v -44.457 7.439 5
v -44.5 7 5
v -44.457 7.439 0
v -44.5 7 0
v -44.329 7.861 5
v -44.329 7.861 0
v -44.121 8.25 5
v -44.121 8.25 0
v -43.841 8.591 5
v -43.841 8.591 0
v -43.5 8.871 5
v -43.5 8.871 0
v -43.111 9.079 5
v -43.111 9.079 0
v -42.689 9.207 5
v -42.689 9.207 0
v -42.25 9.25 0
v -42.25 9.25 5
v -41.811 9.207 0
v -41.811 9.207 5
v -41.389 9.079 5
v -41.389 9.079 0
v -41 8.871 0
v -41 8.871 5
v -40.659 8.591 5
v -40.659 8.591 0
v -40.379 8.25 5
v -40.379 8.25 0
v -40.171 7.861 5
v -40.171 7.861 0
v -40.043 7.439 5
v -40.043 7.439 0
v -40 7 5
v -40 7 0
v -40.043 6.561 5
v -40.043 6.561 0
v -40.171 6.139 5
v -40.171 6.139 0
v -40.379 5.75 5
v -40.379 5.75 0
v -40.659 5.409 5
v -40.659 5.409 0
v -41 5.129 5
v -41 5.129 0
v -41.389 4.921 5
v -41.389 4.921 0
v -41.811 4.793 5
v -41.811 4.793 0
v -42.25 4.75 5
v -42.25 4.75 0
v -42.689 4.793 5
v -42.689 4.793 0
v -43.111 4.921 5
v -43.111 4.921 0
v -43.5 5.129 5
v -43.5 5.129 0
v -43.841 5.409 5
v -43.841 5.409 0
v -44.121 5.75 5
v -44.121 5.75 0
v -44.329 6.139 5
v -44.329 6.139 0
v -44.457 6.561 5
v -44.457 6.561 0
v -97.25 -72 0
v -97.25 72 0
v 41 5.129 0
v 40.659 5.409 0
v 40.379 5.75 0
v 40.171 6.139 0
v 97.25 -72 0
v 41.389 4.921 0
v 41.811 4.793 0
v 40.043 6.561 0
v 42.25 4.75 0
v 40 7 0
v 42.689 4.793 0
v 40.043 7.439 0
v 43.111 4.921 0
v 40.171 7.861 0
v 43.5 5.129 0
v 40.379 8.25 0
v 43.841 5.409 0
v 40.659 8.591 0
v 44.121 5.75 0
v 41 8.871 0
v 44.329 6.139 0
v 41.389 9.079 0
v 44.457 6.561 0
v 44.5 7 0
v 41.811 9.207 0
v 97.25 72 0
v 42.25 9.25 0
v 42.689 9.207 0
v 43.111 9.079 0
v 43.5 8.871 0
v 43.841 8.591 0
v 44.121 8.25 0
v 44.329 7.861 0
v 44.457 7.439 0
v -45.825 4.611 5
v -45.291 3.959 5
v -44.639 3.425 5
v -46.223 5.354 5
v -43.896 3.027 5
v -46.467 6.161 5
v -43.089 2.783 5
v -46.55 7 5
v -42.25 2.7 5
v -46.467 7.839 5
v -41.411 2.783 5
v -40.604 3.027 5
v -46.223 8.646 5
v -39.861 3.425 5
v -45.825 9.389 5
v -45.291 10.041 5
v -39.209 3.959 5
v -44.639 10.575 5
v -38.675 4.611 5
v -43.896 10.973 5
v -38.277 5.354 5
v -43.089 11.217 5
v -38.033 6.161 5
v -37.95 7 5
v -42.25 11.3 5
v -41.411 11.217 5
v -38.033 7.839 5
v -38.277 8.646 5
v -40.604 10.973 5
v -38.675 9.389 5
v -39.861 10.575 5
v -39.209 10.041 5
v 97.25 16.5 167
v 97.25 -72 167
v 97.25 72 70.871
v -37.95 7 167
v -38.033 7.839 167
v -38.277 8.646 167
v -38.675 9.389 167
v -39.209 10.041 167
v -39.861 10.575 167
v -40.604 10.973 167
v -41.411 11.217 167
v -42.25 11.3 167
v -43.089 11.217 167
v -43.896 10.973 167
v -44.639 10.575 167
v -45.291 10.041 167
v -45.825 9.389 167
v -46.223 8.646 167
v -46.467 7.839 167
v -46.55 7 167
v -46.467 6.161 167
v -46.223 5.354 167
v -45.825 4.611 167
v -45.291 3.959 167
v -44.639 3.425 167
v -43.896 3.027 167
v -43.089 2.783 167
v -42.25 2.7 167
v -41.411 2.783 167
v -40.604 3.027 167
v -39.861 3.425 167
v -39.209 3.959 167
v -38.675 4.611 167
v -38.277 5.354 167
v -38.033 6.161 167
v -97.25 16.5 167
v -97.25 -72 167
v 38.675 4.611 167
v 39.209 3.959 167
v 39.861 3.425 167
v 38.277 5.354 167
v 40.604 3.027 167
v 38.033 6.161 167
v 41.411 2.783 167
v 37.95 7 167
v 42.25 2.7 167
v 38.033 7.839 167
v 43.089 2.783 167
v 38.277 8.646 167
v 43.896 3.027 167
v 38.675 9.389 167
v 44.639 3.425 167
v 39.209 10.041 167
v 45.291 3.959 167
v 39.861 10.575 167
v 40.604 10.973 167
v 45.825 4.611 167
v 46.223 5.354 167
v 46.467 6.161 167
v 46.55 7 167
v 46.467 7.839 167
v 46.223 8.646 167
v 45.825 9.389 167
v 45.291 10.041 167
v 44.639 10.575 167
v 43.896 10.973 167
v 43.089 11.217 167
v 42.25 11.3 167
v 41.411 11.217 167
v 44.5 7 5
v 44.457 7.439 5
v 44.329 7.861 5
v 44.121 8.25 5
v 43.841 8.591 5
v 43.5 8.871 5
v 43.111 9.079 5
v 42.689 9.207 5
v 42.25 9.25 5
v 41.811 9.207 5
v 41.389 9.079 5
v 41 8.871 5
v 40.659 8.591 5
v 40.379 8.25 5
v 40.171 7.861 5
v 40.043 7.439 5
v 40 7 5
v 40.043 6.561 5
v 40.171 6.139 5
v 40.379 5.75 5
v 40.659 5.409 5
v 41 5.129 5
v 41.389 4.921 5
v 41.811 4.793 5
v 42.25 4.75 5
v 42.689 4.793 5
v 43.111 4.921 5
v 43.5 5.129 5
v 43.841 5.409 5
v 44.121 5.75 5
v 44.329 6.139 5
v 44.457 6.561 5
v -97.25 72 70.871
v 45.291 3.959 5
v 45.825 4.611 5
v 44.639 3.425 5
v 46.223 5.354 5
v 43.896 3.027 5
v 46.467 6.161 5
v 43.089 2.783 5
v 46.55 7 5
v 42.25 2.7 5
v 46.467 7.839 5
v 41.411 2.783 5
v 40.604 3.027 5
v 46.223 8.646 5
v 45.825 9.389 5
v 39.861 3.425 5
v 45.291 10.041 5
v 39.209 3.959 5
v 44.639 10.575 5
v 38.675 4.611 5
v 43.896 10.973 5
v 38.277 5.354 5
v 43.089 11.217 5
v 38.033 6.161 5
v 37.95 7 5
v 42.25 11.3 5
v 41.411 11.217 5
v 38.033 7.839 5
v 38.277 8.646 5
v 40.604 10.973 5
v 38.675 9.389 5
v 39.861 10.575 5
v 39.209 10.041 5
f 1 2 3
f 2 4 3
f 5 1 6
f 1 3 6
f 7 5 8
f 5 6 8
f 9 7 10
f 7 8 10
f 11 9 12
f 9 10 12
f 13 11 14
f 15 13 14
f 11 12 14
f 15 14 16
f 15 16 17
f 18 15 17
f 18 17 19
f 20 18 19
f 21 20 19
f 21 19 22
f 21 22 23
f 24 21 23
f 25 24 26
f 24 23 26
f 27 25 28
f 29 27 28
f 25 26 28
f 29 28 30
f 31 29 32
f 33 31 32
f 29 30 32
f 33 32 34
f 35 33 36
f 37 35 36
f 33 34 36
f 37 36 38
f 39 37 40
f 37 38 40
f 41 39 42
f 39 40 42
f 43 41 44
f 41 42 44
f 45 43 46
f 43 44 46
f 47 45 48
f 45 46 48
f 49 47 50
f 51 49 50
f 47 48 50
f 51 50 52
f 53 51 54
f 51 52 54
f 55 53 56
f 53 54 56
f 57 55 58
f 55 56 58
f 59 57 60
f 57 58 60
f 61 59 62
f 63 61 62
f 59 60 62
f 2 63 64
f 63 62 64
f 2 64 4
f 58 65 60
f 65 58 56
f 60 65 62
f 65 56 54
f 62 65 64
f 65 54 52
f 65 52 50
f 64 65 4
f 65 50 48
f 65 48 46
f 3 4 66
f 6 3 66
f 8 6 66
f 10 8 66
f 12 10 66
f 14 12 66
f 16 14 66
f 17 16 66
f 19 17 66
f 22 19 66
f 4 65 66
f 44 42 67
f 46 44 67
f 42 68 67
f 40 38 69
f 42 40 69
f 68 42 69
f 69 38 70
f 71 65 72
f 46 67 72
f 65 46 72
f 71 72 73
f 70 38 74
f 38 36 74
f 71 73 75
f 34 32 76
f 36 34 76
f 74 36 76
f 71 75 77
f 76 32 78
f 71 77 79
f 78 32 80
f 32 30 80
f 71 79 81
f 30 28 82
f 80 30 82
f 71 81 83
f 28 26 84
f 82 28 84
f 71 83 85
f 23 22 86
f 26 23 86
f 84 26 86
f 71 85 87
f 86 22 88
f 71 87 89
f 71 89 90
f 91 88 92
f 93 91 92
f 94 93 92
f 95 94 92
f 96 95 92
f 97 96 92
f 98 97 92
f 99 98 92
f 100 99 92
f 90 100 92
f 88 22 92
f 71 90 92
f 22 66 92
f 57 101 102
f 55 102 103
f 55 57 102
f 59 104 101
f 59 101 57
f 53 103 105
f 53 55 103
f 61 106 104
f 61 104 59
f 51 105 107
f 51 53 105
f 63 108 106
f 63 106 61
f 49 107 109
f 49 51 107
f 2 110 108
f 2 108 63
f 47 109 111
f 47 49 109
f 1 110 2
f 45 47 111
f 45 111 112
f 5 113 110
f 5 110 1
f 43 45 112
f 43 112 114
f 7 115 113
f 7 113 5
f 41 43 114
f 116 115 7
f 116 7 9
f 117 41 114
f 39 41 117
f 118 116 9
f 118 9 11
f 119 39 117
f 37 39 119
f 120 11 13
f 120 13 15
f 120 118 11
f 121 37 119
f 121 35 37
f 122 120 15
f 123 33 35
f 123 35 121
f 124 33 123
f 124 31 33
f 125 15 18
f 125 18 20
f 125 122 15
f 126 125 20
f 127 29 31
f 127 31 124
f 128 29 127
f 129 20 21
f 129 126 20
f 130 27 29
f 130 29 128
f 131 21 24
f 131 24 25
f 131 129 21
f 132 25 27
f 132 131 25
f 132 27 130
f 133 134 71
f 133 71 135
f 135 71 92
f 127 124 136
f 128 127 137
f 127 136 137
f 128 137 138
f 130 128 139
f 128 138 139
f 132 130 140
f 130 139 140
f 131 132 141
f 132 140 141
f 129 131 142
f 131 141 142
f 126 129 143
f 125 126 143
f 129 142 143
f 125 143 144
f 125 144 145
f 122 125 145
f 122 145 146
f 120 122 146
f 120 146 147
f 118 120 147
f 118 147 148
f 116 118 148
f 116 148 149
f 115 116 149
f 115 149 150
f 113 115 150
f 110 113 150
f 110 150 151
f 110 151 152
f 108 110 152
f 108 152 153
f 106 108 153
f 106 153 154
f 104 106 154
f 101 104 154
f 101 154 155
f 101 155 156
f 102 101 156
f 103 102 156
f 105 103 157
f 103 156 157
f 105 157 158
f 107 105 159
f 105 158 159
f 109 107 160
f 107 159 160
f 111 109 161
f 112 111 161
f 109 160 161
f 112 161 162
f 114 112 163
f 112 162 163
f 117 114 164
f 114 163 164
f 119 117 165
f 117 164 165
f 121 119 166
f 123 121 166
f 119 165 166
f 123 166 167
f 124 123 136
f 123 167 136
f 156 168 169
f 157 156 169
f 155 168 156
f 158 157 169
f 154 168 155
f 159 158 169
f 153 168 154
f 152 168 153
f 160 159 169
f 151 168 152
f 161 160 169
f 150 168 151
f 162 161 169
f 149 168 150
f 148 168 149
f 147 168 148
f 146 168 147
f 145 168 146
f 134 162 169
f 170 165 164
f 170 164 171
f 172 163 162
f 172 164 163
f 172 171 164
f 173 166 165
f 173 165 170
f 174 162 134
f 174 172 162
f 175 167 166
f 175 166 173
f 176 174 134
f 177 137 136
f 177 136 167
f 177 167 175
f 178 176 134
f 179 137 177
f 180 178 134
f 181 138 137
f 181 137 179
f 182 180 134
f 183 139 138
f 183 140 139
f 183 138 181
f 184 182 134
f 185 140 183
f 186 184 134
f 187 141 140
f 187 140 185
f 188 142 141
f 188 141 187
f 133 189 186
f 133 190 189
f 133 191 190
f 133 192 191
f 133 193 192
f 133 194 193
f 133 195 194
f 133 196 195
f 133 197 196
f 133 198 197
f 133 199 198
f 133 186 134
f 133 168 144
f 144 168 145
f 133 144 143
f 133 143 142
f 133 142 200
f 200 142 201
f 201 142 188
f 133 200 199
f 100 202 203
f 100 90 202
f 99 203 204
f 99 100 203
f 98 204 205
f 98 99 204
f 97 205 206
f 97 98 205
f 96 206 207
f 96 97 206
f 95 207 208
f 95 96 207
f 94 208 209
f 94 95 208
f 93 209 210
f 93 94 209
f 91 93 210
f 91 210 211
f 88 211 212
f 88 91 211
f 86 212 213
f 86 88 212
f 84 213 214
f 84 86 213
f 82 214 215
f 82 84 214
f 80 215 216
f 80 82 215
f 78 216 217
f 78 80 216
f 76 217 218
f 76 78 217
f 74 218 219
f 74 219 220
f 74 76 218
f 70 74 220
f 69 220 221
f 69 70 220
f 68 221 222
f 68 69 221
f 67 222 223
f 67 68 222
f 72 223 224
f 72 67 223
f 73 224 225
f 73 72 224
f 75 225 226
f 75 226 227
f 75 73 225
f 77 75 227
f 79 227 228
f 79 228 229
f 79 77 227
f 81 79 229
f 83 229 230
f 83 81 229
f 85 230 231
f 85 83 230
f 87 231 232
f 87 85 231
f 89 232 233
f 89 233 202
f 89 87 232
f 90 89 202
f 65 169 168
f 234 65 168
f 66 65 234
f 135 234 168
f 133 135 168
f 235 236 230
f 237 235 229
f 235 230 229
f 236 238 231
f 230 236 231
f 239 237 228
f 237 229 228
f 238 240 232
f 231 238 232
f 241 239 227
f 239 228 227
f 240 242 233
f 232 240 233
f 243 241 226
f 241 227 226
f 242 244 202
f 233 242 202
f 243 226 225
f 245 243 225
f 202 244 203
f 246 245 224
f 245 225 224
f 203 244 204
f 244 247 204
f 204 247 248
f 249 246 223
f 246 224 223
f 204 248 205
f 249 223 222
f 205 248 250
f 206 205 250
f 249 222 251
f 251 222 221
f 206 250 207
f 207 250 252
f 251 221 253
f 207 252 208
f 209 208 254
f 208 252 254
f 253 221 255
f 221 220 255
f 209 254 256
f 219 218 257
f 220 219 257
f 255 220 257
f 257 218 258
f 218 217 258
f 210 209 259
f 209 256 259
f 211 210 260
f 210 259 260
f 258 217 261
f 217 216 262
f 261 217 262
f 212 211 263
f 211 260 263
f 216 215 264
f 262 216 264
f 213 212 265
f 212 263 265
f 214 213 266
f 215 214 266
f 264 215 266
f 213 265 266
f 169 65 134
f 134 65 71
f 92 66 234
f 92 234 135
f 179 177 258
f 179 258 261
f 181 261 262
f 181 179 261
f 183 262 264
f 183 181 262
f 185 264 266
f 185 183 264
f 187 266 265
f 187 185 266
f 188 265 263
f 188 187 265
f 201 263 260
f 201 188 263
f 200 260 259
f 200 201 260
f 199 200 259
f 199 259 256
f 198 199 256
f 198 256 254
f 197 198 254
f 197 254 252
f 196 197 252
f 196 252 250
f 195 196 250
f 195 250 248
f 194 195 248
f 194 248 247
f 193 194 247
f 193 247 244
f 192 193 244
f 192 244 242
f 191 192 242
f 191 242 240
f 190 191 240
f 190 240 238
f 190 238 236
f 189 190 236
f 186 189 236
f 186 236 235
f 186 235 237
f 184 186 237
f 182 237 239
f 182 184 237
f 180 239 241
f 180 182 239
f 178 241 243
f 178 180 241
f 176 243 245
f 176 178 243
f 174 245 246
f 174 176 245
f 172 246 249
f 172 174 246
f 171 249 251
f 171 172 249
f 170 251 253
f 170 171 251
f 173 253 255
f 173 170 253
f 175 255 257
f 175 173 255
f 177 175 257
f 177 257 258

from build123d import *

# Parameters (mm, degrees)
SKIZZE2_W                                           = 194.5
SKIZZE2_H                                           = 144
AUFSATZ_LINEAR_AUSTRAGEN1_DEPTH                     = 167
STIRNSENKUNG_F_R_M4_SENKSCHRAUBE_KOPF_B_D           = 4.5
STIRNSENKUNG_F_R_M4_SENKSCHRAUBE_KOPF_B_CBORE_D     = 8.6
STIRNSENKUNG_F_R_M4_SENKSCHRAUBE_KOPF_B_CBORE_DEPTH = 162
SCHNITT_LINEAR_AUSTRAGEN1_DEPTH                     = 267.27664186


with BuildPart() as part:
    # Skizze2 → Aufsatz-Linear austragen1 (new body)
    with BuildSketch(Plane.XY):
        Rectangle(SKIZZE2_W, SKIZZE2_H)
    extrude(amount=AUFSATZ_LINEAR_AUSTRAGEN1_DEPTH)

    # Stirnsenkung für M4 Senkschraube (Kopf Button)1 (through all)
    with Locations(Plane.XY.offset(167)):
        with Locations((-42.25, 7)):
            stirnsenkung_f_r_m4_senkschraube_kopf_b = CounterBoreHole(STIRNSENKUNG_F_R_M4_SENKSCHRAUBE_KOPF_B_D / 2, STIRNSENKUNG_F_R_M4_SENKSCHRAUBE_KOPF_B_CBORE_D / 2, STIRNSENKUNG_F_R_M4_SENKSCHRAUBE_KOPF_B_CBORE_DEPTH)

    # Spiegeln1: Stirnsenkung für M4 Senkschraube (Kopf Button)1 across plane
    add(stirnsenkung_f_r_m4_senkschraube_kopf_b.mirror(Plane(origin=(0, 0, 0), x_dir=(0, 0, 1), z_dir=(1, 0, 0))), mode=Mode.SUBTRACT)

    # Skizze6 → Schnitt-Linear austragen1 (cut, through all)
    with BuildSketch(Plane.ZY.offset(97.25)):
        Polygon((70.87118018, 72), (167, 16.5), (205.188147907, 84.754255682), (82.593849392, 116.819294381), align=None)
    extrude(amount=-SCHNITT_LINEAR_AUSTRAGEN1_DEPTH, mode=Mode.SUBTRACT)


solid = part.part
